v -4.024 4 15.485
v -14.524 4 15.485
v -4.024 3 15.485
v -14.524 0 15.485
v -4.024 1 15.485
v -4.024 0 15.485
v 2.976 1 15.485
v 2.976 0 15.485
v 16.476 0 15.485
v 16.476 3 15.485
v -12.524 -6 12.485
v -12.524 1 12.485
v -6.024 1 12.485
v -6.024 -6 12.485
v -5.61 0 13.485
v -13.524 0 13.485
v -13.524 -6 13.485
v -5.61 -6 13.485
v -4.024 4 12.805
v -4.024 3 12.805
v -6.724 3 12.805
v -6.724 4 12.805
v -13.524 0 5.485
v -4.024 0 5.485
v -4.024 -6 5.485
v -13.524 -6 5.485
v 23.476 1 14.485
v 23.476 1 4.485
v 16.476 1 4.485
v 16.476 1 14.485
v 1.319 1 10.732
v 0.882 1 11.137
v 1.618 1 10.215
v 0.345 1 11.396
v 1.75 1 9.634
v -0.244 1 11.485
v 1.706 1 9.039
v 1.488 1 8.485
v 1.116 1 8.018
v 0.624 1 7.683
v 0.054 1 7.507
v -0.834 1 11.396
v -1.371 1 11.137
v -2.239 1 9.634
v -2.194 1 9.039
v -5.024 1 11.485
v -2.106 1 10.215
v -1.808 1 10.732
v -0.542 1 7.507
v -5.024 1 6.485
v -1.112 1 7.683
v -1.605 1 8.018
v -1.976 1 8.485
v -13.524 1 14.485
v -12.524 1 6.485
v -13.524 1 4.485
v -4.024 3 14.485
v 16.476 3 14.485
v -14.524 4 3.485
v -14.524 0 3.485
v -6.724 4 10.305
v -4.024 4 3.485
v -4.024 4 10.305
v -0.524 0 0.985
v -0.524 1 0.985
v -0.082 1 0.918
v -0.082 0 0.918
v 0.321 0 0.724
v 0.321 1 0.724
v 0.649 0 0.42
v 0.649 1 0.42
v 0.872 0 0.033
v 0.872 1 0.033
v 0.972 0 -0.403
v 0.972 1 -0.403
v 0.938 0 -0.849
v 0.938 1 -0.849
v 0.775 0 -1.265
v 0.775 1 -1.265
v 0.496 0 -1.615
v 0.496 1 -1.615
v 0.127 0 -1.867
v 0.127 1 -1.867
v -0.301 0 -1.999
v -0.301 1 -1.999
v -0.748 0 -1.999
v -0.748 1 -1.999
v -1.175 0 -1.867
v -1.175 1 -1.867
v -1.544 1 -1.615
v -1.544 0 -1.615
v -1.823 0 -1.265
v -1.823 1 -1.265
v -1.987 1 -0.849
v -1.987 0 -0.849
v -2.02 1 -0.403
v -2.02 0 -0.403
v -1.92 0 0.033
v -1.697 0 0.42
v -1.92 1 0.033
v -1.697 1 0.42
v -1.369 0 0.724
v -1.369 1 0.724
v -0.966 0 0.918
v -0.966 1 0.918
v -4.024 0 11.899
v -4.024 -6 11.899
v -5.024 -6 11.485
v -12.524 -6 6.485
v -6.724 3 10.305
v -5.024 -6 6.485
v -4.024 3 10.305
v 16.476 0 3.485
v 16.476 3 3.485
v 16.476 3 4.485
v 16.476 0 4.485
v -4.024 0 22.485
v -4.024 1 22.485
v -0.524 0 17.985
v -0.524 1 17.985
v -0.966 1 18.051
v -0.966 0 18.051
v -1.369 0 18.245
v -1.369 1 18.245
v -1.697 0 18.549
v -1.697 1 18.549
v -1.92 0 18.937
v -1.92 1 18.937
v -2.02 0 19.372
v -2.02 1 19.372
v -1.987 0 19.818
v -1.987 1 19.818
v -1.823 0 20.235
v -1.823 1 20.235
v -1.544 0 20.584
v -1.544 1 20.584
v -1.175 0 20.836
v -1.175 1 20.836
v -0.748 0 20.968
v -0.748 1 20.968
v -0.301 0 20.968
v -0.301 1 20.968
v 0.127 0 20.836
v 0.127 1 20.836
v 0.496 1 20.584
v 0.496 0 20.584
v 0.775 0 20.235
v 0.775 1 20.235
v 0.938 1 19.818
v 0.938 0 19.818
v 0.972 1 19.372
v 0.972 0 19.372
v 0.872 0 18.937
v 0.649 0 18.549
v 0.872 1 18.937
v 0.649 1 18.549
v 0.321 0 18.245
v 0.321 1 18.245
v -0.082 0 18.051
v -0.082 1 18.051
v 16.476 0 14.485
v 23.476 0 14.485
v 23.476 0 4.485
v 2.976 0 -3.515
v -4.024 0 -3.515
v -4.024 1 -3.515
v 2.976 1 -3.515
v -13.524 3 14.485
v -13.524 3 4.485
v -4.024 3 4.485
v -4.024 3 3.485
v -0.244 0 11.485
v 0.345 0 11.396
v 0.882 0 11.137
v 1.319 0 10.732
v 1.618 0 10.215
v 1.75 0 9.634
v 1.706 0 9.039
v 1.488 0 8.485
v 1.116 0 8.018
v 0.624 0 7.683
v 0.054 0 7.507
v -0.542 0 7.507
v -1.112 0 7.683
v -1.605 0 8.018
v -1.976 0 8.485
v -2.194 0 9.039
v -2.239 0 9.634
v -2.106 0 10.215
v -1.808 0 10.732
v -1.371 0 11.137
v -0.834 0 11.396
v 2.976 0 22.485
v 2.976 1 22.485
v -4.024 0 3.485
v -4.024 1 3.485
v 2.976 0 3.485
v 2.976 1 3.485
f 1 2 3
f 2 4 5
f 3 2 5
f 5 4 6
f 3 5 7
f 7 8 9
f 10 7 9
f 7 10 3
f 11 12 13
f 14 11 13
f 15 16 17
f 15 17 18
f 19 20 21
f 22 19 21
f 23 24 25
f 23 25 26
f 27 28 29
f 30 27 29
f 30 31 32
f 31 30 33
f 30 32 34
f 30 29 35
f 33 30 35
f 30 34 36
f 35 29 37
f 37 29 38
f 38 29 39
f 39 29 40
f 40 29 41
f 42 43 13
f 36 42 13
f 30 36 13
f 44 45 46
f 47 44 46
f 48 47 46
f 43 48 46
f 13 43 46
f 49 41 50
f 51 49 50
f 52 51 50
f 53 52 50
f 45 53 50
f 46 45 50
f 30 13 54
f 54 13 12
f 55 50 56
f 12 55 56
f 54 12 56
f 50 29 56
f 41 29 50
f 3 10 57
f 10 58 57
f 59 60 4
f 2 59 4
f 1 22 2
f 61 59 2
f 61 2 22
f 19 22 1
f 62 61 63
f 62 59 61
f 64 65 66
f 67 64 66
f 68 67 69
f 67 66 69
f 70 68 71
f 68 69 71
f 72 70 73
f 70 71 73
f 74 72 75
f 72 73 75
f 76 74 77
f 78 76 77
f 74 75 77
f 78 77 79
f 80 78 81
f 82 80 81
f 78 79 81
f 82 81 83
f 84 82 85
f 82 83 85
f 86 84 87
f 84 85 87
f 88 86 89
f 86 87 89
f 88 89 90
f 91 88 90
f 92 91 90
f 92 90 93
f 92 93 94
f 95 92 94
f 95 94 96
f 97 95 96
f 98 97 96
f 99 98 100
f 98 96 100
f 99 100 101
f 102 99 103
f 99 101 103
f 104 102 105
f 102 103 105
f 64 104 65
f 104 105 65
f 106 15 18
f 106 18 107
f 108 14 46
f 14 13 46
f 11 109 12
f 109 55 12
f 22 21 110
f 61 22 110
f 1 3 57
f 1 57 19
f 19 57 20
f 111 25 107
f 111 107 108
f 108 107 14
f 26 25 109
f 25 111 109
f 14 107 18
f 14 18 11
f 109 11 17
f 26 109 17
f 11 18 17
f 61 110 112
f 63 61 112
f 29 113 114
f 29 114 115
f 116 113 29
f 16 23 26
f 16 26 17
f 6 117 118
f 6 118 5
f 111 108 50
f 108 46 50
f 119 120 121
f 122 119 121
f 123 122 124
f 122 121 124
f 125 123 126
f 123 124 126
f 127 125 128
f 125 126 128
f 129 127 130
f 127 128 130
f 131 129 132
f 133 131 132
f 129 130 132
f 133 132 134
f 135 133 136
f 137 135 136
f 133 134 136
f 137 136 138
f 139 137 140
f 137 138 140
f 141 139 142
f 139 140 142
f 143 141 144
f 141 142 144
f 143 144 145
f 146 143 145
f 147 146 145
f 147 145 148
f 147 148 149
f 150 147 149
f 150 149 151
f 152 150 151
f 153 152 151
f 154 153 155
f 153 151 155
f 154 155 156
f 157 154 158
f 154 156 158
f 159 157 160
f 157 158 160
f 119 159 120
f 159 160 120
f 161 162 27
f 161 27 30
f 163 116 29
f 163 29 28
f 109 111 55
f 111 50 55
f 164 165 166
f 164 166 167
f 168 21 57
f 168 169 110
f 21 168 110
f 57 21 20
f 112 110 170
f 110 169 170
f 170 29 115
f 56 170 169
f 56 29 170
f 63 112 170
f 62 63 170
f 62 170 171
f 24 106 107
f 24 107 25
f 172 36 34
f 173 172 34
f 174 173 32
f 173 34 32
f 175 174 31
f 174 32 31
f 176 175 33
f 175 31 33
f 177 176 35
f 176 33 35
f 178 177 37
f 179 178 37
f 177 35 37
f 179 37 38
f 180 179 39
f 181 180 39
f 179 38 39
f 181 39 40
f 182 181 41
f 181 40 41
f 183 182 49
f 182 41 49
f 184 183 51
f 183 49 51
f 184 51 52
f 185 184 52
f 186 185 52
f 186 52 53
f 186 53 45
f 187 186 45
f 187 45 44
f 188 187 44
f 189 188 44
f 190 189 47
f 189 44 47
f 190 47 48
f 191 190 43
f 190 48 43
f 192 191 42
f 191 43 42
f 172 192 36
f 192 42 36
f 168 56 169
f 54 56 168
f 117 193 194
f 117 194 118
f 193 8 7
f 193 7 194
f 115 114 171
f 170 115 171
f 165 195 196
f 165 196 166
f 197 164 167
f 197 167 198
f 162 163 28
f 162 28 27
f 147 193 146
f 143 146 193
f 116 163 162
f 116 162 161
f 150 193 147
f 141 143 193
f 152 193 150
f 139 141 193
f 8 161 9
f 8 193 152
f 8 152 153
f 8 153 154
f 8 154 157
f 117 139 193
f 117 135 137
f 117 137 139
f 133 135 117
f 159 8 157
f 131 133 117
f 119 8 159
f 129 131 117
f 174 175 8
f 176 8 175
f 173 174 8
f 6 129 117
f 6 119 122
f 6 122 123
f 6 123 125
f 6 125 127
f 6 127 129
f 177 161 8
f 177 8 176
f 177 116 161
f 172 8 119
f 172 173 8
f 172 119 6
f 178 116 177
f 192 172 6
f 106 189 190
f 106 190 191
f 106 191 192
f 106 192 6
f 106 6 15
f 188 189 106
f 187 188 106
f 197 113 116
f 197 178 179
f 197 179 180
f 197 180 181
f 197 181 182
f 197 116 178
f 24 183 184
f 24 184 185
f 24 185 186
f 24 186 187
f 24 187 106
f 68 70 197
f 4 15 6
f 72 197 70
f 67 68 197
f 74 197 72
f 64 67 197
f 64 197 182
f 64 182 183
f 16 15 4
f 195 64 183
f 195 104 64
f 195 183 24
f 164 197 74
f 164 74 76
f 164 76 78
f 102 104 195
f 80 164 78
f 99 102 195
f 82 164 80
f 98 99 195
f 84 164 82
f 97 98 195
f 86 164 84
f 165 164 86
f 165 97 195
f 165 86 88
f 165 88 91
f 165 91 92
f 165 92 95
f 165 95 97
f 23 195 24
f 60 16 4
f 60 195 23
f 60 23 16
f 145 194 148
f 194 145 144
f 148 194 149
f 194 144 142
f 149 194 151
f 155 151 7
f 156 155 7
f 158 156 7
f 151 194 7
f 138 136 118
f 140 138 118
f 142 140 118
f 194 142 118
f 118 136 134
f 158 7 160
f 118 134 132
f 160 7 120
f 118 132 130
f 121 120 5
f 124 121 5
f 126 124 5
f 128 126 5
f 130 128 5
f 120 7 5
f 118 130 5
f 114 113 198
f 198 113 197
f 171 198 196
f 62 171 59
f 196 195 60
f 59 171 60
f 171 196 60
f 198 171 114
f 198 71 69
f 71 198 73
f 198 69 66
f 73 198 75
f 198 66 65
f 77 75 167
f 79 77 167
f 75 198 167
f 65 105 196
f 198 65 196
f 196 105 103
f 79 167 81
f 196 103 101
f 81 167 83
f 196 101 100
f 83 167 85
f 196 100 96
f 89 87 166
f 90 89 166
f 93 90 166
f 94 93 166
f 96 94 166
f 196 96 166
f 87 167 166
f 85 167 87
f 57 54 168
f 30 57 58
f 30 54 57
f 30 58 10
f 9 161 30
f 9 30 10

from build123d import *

# Parameters (mm, degrees)
EXTRUDE_1_DEPTH     = 1
EXTRUDE_2_DEPTH     = 6
SKETCH_3_R          = 2
CUT_EXTRUDE_1_DEPTH = 1
EXTRUDE_3_DEPTH     = 2
EXTRUDE_4_DEPTH     = 1
SKETCH_6_R          = 1.5
CUT_EXTRUDE_2_DEPTH = 1


with BuildPart() as part:
    # 草图1 → 凸台-拉伸1 (new body)
    with BuildSketch(Plane(origin=(0, 0, 0), x_dir=(1, 0, 0), z_dir=(0, 1, 0))):
        Polygon((23.47582205, -4.484524381), (23.47582205, -14.484524381), (16.47582205, -14.484524381), (16.47582205, -15.484524381), (2.97582205, -15.484524381), (2.97582205, -22.484524381), (-4.02417795, -22.484524381), (-4.02417795, -15.484524381), (-14.52417795, -15.484524381), (-14.52417795, -3.484524381), (-4.02417795, -3.484524381), (-4.02417795, 3.515475619), (2.97582205, 3.515475619), (2.97582205, -3.484524381), (16.47582205, -3.484524381), (16.47582205, -4.484524381), align=None)
        Polygon((-12.52417795, -6.484524381), (-12.52417795, -12.484524381), (-6.02417795, -12.484524381), (-5.02417795, -11.484524381), (-5.02417795, -6.484524381), align=None, mode=Mode.SUBTRACT)
    extrude(amount=EXTRUDE_1_DEPTH)

    # 草图2 → 凸台-拉伸2 (add)
    with BuildSketch(Plane.XZ):
        Polygon((-13.52417795, 5.484524381), (-13.52417795, 13.484524381), (-5.609964387, 13.484524381), (-4.02417795, 11.898737944), (-4.02417795, 5.484524381), align=None)
        Polygon((-12.52417795, 12.484524381), (-6.02417795, 12.484524381), (-5.02417795, 11.484524381), (-5.02417795, 6.484524381), (-12.52417795, 6.484524381), align=None, mode=Mode.SUBTRACT)
    extrude(amount=EXTRUDE_2_DEPTH)

    # 草图3 → 切除-拉伸1 (cut)
    with BuildSketch(Plane(origin=(0, 1, 0), x_dir=(1, 0, 0), z_dir=(0, 1, 0))):
        with Locations(Location((-0.24417795, -9.484524381, 0), (0, 0, 270))):
            Circle(SKETCH_3_R)
    extrude(amount=-CUT_EXTRUDE_1_DEPTH, mode=Mode.SUBTRACT)

    # 草图4 → 凸台-拉伸3 (add)
    with BuildSketch(Plane(origin=(0, 1, 0), x_dir=(1, 0, 0), z_dir=(0, 1, 0))):
        Polygon((-14.52417795, -3.484524381), (16.47582205, -3.484524381), (16.47582205, -4.484524381), (-13.52417795, -4.484524381), (-13.52417795, -14.484524381), (16.47582205, -14.484524381), (16.47582205, -15.484524381), (-14.52417795, -15.484524381), align=None)
    extrude(amount=EXTRUDE_3_DEPTH)

    # 草图5 → 凸台-拉伸4 (add)
    with BuildSketch(Plane(origin=(0, 3, 0), x_dir=(1, 0, 0), z_dir=(0, 1, 0))):
        Polygon((-14.52417795, -3.484524381), (-14.52417795, -15.484524381), (-4.02417795, -15.484524381), (-4.02417795, -12.804524381), (-6.72417795, -12.804524381), (-6.72417795, -10.304524381), (-4.02417795, -10.304524381), (-4.02417795, -3.484524381), align=None)
    extrude(amount=EXTRUDE_4_DEPTH)

    # 草图6 → 切除-拉伸2 (cut)
    with BuildSketch(Plane(origin=(0, 1, 0), x_dir=(1, 0, 0), z_dir=(0, 1, 0))):
        with Locations(Location((-0.52417795, 0.515475619, 0), (0, 0, 270))):
            Circle(SKETCH_6_R)
        with Locations(Location((-0.52417795, -19.484524381, 0), (0, 0, 90))):
            Circle(SKETCH_6_R)
    extrude(amount=-CUT_EXTRUDE_2_DEPTH, mode=Mode.SUBTRACT)


solid = part.part
